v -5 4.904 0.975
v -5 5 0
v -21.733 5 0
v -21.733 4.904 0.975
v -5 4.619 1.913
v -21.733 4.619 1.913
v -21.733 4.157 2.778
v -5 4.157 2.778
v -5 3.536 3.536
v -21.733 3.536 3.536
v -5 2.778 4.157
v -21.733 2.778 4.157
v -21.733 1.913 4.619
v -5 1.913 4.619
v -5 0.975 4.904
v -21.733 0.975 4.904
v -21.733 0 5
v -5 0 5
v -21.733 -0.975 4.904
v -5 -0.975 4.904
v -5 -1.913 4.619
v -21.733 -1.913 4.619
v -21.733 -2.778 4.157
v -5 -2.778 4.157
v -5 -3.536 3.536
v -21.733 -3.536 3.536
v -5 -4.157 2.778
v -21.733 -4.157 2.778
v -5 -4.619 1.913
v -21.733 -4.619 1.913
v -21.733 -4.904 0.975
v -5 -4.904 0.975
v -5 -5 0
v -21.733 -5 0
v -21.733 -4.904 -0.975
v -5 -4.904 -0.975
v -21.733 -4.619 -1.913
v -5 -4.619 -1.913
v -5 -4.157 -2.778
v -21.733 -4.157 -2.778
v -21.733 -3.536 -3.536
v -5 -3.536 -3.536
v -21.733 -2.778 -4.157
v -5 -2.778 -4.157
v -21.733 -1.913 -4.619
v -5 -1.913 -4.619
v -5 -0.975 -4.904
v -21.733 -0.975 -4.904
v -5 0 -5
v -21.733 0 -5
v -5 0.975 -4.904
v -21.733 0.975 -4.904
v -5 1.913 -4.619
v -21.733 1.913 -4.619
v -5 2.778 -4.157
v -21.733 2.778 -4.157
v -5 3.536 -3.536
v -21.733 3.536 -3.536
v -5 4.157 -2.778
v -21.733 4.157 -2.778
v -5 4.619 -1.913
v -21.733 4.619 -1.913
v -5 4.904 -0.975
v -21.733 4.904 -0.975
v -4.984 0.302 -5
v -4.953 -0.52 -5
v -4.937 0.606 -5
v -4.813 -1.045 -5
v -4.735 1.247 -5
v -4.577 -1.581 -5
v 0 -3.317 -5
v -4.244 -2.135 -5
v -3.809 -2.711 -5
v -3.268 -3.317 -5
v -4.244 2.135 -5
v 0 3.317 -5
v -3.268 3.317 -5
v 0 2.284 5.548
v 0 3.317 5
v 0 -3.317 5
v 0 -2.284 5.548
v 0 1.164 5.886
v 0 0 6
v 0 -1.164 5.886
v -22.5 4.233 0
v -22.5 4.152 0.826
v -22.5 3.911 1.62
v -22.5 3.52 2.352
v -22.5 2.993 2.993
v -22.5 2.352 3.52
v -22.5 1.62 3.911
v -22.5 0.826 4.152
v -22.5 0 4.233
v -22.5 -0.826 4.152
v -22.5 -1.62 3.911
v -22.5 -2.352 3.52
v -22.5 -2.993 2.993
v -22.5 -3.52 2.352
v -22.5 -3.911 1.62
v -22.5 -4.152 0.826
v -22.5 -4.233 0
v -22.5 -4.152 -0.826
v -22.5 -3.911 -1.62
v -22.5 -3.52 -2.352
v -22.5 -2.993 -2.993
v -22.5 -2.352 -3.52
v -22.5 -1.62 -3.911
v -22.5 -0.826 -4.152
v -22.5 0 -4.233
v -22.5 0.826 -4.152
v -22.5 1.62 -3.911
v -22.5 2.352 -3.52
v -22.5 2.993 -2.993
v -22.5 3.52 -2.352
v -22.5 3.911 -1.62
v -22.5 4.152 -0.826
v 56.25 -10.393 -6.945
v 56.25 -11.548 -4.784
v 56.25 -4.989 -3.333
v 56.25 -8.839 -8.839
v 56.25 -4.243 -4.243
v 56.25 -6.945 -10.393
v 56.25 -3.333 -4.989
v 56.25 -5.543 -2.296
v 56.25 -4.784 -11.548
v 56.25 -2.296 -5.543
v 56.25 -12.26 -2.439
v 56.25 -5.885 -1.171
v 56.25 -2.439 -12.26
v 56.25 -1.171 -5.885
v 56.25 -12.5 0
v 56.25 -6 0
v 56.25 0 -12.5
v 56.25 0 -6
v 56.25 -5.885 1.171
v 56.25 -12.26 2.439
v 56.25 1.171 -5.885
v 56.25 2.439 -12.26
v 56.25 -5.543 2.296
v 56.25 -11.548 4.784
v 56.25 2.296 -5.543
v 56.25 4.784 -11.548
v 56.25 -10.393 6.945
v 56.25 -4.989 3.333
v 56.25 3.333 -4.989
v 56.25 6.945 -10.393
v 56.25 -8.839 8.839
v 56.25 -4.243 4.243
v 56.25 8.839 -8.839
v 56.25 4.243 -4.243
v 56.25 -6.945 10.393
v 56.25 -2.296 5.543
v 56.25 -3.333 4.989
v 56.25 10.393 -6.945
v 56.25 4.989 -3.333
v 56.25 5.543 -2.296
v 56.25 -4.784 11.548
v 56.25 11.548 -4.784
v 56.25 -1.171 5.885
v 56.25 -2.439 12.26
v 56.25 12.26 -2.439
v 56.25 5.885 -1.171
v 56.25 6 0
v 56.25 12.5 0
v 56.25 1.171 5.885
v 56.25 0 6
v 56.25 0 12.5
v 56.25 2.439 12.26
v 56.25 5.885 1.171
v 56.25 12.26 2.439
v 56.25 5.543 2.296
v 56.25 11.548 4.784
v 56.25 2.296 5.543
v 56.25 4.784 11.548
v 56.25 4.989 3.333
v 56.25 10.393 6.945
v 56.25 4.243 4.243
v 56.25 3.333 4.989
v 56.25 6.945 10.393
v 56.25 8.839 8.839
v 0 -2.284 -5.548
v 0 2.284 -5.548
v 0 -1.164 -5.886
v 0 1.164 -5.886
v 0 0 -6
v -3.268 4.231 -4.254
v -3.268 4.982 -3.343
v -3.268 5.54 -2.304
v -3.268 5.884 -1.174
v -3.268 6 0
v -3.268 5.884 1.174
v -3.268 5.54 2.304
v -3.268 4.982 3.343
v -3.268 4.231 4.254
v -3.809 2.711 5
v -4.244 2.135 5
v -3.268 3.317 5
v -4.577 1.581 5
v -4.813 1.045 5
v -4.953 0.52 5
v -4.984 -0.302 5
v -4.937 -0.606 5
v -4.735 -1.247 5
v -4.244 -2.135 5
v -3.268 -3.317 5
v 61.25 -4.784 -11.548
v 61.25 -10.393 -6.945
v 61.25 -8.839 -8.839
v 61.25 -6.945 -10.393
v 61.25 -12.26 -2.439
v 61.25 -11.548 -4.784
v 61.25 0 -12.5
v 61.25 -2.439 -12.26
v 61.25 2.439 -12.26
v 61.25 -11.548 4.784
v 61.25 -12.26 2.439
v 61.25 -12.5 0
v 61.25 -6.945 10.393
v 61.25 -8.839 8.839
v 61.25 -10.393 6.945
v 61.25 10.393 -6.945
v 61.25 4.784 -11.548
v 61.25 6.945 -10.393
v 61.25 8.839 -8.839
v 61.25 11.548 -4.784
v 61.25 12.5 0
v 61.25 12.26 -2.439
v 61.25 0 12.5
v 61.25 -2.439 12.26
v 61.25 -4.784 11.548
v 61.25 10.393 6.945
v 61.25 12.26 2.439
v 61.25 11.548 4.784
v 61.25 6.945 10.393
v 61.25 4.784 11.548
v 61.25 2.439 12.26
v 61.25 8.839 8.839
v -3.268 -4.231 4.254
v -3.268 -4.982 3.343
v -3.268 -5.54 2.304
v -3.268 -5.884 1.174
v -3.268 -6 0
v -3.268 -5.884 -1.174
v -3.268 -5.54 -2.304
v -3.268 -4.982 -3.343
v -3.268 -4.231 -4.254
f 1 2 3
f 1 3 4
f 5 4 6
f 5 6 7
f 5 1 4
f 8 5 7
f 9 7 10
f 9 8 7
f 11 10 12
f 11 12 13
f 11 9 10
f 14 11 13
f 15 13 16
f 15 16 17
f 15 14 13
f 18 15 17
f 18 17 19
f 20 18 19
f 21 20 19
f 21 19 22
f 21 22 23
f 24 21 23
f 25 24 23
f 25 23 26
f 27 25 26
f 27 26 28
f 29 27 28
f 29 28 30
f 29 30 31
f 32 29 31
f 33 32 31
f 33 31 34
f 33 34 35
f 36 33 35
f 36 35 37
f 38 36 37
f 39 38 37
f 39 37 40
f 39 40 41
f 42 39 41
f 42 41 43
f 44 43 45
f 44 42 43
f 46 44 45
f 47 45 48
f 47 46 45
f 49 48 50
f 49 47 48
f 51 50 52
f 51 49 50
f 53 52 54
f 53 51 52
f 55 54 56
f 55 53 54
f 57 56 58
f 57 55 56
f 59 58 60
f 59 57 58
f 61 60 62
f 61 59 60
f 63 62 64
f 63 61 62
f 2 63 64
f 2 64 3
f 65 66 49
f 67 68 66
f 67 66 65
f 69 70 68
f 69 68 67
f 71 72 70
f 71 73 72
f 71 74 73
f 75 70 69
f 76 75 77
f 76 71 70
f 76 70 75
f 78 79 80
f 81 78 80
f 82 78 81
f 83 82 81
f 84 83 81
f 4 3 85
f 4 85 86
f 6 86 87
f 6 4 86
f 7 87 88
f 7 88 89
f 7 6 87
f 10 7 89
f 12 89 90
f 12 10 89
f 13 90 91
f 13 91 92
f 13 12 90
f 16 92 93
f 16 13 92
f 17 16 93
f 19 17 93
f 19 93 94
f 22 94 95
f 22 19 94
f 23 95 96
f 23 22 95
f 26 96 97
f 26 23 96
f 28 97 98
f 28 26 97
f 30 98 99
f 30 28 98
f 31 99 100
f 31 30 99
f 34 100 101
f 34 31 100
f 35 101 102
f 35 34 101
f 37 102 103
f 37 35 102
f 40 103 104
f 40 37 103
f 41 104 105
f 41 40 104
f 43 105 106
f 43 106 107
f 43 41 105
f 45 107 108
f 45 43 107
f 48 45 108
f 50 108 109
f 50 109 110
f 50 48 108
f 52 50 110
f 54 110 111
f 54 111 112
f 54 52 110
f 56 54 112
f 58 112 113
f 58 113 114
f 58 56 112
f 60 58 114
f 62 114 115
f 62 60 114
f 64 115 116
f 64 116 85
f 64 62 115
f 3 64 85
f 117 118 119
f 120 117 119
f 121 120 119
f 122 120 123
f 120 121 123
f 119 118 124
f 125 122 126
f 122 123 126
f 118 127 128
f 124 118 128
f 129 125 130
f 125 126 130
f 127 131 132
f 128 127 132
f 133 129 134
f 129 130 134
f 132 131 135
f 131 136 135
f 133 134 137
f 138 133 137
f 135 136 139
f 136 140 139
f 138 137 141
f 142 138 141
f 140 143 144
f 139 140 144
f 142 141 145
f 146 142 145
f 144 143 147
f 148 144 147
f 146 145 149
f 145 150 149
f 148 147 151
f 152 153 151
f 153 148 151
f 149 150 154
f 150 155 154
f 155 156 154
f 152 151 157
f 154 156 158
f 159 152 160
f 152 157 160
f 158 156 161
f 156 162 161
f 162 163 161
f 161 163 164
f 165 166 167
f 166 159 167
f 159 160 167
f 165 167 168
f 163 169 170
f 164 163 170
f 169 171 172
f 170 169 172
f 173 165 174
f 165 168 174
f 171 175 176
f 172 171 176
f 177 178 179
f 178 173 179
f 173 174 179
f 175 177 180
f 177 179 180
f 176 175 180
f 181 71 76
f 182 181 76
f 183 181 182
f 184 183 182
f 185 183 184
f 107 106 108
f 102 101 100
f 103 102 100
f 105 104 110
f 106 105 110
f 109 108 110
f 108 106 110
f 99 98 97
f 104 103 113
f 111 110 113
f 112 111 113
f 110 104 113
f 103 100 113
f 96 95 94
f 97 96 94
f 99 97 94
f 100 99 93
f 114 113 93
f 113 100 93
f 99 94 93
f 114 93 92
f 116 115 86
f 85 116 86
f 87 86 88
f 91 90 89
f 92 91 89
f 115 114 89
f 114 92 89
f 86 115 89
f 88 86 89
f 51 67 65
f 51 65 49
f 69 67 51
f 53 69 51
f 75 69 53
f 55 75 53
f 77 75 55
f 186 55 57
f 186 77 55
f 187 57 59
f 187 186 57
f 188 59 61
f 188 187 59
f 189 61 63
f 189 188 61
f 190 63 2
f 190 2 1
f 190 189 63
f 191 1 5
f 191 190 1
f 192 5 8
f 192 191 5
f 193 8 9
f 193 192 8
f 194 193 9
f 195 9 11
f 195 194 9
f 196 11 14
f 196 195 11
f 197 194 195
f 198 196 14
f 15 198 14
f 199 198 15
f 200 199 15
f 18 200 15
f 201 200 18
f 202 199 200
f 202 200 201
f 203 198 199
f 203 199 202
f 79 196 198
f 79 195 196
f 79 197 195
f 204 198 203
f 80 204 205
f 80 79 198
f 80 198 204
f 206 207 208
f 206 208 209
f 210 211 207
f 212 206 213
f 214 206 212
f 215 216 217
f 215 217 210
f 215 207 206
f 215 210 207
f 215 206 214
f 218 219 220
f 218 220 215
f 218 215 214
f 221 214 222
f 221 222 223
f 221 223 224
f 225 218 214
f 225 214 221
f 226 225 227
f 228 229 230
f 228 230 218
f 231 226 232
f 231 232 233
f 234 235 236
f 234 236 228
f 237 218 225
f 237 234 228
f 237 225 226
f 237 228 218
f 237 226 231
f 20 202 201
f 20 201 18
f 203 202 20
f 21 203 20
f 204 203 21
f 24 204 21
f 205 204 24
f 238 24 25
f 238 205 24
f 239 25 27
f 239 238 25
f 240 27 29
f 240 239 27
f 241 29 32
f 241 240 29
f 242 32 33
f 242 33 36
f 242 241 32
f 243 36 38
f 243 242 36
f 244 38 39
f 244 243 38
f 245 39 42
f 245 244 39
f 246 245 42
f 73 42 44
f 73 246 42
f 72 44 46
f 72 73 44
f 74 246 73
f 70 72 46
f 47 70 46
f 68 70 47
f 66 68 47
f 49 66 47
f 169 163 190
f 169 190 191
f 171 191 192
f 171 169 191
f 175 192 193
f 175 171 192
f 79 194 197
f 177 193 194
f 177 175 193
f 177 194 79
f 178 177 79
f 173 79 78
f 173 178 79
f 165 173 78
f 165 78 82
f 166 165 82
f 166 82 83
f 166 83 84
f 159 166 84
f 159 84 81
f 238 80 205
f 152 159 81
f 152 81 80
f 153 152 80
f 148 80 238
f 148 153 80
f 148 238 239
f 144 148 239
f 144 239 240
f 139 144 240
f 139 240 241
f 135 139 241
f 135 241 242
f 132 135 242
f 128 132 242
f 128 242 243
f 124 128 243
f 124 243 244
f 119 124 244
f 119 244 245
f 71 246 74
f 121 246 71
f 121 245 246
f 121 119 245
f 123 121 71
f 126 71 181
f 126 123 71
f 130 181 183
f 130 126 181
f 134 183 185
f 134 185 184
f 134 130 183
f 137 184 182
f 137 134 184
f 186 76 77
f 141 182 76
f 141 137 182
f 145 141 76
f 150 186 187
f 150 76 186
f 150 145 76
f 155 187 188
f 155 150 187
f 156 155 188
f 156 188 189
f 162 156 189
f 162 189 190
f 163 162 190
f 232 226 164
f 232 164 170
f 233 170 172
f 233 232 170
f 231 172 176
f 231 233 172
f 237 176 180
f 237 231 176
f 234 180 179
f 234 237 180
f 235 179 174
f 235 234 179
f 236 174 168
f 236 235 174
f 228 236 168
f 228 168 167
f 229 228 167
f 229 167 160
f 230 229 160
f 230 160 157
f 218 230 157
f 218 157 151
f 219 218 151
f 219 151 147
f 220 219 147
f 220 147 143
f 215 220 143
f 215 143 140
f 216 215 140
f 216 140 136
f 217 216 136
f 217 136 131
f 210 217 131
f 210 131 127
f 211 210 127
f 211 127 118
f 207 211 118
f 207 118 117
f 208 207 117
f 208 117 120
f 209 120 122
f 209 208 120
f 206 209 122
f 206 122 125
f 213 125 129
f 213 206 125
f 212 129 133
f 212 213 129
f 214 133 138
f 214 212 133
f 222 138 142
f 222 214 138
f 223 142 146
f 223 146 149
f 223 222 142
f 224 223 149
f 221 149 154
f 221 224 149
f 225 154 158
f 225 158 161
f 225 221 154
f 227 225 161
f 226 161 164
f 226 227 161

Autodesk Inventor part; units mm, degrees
sketch "Sketch_3" plane through (0, 0, 0) normal (0, 0, 1) x (1, 0, 0)
  line L0 (61.25, 0) -> (-22.5, 0)
  line L1 (-22.5, 0) -> (-22.5, 4.233)
  line L2 (-22.5, 4.233) -> (-21.733, 5)
  line L3 (-21.733, 5) -> (-5, 5)
  line L4 (-5, 5) -> (-3.2679, 6)
  line L5 (-3.2679, 6) -> (56.25, 6)
  line L6 (56.25, 6) -> (56.25, 12.5)
  line L7 (56.25, 12.5) -> (61.25, 12.5)
  line L8 (61.25, 12.5) -> (61.25, 0)
  line L9 (61.25, 0) -> (-22.5, 0)
revolve "Revolution1" add sketch "Sketch_3" angle 360 about axis through (61.25, 0, 0) along (1, 0, 0)
thread "Thread1" size "M10x1.25" class "6g" standard "ISO Metric profile" length 14.233
sketch "Sketch_7" plane through (0, 0, 0) normal (1, 0, 0) x (0, 0, -1)
  circle A0 centre (0, 0) radius 12
  line L0 (-5, 7) -> (-5, -7)
  line L1 (-5, -7) -> (5, -7)
  line L2 (5, -7) -> (5, 7)
  line L3 (5, 7) -> (-5, 7)
extrude "Extrusion1" cut sketch "Sketch_7" against normal blind 5
ref_plane "ROD_BODY_XY" through (0, 0, 0) normal (1, 0, 0) x (0, 0, -1)
ref_plane "ROD_BODY_YZ" through (0, 0, 0) normal (0, 0, -1) x (0, 1, 0)
ref_plane "ROD_BODY_ZX" through (0, 0, 0) normal (0, 1, 0) x (1, 0, 0)
ref_plane "ROD_NUT_XY" through (-22.5, 0, 0) normal (-1, 0, 0) x (0, 0, -1)
ref_plane "ROD_NUT_YZ" through (-22.5, 0, 0) normal (0, 0, -1) x (0, -1, 0)
ref_plane "ROD_NUT_ZX" through (-22.5, 0, 0) normal (0, -1, 0) x (-1, 0, 0)
properties part number "CDQSB25-40DM(1_0)_ROD"
